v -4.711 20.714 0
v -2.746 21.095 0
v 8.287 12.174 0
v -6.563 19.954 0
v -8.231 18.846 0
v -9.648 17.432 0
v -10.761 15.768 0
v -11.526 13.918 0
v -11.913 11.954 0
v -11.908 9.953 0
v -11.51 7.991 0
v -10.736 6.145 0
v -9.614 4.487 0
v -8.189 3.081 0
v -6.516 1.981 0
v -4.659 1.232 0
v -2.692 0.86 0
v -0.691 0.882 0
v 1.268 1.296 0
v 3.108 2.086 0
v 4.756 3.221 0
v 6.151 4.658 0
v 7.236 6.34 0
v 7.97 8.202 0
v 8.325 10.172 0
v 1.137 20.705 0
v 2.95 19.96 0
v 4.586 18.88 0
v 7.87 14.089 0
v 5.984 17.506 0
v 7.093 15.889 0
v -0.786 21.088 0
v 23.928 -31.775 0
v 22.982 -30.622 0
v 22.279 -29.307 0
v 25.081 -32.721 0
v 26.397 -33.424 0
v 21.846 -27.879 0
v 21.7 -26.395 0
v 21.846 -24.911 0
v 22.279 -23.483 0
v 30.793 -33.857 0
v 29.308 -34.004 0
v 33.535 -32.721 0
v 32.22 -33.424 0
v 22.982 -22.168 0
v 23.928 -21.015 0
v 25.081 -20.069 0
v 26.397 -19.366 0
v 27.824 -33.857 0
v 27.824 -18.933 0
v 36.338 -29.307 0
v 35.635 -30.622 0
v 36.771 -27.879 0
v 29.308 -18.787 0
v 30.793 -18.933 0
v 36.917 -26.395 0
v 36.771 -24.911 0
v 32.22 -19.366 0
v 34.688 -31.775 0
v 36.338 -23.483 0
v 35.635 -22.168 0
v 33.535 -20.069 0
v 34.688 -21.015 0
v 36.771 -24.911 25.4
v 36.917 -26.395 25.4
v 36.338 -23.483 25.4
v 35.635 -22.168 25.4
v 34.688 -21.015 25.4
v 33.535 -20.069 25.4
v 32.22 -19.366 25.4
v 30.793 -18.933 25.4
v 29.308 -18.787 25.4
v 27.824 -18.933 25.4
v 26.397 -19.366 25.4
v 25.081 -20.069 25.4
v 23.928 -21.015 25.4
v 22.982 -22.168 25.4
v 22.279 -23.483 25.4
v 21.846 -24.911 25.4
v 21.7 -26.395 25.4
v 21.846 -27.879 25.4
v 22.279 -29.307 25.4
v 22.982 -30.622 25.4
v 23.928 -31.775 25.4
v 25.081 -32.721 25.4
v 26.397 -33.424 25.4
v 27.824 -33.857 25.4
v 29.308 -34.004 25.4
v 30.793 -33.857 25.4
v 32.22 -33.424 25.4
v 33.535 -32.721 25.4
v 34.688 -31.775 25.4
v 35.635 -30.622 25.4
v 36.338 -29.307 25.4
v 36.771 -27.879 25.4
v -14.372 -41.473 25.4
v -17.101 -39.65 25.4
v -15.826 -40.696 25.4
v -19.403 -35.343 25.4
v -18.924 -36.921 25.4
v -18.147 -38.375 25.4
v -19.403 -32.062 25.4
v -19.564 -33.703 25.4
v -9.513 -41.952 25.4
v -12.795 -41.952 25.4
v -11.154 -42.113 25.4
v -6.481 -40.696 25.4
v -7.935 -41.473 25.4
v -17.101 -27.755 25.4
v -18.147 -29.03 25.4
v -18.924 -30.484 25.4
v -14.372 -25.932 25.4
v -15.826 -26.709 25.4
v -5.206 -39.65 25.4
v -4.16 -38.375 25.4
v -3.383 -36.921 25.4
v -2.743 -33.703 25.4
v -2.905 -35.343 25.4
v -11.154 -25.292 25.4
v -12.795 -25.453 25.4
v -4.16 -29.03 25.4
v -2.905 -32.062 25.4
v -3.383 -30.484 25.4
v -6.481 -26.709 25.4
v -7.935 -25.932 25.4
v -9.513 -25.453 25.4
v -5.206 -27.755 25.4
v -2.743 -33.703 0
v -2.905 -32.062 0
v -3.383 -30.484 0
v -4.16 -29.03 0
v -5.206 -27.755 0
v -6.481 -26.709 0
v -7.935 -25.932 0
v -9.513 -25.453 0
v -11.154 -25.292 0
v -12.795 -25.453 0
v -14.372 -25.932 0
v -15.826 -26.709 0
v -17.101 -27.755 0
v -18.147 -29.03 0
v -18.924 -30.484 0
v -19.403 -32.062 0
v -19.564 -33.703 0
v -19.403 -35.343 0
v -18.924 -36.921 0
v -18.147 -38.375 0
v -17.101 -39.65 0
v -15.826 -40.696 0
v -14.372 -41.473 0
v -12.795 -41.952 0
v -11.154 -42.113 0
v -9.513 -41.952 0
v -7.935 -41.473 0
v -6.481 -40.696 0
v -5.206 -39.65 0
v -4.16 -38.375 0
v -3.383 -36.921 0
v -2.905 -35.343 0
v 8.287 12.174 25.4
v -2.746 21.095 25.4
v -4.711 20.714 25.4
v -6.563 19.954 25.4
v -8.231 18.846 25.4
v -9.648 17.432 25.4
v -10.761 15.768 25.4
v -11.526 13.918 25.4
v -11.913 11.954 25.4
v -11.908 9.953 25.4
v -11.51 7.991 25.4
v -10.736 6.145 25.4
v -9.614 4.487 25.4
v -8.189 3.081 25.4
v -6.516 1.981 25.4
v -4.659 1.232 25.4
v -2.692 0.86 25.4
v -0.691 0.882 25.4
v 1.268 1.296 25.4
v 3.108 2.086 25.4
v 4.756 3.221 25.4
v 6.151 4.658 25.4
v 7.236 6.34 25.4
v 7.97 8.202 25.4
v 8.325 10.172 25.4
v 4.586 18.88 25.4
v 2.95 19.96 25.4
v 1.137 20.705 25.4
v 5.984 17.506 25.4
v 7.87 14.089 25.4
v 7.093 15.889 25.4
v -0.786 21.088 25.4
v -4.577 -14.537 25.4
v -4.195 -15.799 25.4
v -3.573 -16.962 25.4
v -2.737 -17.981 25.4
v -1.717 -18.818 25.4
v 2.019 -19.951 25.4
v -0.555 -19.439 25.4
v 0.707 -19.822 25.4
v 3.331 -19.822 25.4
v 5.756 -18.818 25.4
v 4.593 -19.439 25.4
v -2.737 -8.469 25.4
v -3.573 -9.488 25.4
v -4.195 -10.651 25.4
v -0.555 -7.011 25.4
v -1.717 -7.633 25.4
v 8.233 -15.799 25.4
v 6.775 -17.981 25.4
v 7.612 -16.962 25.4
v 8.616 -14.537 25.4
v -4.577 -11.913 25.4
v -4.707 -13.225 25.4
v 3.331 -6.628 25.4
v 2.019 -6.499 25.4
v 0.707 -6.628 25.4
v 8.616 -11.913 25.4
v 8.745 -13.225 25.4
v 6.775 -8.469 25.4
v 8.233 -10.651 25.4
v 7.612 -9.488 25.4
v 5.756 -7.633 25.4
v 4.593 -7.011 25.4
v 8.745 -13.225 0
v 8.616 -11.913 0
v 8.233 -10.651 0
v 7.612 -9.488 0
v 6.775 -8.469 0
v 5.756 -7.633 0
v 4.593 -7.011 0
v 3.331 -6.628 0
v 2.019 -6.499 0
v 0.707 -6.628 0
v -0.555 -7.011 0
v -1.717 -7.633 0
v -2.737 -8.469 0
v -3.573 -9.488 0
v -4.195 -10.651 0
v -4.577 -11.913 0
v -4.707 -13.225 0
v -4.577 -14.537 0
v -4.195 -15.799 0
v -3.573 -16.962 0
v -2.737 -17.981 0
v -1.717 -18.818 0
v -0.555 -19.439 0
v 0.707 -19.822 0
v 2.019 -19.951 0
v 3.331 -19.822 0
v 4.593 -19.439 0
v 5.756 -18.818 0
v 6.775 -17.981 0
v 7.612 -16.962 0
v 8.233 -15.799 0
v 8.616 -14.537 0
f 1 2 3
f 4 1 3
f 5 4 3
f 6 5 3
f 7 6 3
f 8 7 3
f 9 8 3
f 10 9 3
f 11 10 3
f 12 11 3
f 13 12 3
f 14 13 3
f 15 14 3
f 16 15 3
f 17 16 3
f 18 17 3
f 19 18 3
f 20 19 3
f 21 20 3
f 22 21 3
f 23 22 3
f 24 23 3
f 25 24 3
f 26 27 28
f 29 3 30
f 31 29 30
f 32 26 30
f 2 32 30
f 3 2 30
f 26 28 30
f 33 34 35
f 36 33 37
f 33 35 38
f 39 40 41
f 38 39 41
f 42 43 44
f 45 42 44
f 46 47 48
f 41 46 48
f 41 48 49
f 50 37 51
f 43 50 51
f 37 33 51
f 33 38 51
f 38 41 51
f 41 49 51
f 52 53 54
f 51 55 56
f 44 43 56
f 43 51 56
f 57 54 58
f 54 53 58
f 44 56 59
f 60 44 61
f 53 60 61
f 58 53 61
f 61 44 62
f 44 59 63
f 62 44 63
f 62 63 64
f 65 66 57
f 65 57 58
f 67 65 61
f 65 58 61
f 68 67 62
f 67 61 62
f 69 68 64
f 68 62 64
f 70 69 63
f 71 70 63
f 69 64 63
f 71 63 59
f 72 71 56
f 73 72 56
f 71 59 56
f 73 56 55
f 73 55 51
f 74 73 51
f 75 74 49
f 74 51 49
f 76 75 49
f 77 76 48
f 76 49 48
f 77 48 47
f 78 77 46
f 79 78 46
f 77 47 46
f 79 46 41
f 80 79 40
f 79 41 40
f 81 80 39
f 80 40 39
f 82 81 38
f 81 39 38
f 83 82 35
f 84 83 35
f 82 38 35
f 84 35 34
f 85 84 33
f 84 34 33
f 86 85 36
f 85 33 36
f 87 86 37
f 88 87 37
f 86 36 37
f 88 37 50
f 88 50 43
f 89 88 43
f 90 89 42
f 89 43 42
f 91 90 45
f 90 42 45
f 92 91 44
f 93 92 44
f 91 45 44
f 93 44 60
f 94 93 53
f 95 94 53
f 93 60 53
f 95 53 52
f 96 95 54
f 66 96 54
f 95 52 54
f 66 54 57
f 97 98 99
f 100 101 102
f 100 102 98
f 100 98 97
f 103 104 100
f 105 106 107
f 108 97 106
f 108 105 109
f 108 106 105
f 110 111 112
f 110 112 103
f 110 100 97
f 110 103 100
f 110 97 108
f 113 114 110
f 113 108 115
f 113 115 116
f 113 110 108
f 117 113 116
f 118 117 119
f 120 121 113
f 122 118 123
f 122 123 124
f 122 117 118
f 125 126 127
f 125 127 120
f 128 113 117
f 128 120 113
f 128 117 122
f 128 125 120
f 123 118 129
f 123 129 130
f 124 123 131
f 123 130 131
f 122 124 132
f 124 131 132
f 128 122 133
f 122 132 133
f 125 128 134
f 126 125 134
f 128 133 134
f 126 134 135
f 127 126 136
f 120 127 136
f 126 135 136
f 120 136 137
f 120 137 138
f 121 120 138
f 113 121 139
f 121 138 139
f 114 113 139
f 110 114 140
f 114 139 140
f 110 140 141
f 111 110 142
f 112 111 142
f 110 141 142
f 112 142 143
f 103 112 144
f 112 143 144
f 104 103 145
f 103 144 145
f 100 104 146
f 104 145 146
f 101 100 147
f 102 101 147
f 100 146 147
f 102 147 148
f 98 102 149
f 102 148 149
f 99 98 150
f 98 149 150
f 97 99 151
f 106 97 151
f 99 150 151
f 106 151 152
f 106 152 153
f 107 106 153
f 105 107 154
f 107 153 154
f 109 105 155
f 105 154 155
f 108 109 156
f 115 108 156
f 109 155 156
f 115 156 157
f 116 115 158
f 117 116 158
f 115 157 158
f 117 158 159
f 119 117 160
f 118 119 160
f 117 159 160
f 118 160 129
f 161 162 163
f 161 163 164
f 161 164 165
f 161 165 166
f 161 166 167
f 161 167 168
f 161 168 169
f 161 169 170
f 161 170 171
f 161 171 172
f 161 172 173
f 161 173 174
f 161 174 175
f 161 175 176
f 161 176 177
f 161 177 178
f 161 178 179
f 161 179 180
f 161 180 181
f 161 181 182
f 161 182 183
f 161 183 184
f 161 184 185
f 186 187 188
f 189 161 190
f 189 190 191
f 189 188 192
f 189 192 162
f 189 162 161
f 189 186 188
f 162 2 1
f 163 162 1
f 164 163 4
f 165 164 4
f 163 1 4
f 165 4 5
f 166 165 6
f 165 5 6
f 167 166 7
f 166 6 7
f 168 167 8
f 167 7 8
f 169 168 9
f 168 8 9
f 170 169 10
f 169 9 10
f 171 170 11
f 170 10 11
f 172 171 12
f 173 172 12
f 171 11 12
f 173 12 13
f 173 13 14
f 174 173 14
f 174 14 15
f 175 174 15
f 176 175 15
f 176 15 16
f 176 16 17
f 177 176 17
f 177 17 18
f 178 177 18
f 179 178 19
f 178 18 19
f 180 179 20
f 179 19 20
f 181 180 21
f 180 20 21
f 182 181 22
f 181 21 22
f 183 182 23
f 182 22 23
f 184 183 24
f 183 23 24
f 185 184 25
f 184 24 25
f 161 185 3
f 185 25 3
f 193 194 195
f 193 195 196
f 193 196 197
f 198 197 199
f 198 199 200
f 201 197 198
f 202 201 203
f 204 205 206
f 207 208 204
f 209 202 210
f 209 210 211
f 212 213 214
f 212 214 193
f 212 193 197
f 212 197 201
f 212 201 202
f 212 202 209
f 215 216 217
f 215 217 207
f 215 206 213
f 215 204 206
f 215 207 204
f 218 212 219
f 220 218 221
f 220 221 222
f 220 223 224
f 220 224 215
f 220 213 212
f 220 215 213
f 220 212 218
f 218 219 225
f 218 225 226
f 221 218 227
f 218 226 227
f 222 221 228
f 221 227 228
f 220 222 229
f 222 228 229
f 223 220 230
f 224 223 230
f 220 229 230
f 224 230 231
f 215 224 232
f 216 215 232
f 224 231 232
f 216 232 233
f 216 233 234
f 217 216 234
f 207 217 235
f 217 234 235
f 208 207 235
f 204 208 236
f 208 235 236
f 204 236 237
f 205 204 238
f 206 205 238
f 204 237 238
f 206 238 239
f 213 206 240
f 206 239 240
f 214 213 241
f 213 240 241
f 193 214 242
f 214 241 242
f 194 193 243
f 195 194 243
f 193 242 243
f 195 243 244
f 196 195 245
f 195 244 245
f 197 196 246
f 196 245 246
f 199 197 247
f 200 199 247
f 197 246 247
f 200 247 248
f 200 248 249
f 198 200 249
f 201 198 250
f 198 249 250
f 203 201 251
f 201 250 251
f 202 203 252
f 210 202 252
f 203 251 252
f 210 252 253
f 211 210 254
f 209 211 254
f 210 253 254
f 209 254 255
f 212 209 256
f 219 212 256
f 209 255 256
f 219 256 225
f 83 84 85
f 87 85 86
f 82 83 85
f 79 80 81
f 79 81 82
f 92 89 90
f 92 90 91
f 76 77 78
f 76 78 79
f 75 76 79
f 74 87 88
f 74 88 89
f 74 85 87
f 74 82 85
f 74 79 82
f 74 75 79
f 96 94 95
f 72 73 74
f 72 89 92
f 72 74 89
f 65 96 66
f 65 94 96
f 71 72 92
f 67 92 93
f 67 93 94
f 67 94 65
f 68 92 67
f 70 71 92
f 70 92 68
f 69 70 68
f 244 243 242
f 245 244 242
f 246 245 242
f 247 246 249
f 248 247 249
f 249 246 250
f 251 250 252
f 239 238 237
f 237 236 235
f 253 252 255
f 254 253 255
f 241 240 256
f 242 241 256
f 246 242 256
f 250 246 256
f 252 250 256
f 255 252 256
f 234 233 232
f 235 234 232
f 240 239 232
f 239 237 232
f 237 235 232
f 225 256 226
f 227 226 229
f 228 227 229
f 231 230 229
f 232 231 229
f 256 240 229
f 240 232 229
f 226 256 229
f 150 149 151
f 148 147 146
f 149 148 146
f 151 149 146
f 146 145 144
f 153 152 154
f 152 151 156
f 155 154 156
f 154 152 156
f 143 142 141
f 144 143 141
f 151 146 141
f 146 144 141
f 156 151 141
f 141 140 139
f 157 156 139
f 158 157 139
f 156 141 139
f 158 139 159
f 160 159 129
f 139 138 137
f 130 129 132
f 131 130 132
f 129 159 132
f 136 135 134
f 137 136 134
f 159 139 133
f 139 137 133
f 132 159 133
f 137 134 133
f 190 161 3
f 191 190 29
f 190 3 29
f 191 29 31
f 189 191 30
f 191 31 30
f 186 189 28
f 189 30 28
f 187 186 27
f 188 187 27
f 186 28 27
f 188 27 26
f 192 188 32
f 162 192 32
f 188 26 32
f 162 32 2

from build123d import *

# Parameters (mm, degrees)
F5_DEPTH = 25.4
F4_R     = 6.7259983567
F1_R     = 8.4107438271
F2_R     = 7.608509741


# Not quite as in the source:
# - the program builds the solid bodies; features that only make, move or delete a surface that nothing else refers to are left out


with BuildPart() as f5:
    # F0 (on Top) → F5 (new body)
    with BuildSketch(Plane.XY):
        with BuildLine():
            ThreePointArc((-11.4537579939, 7.812615484), (0.3902658063, 1.0605246734), (8.2872472703, 12.1739991009))
            ThreePointArc((8.2872472703, 12.1739991009), (4.5861760116, 18.8798650483), (-2.7458775352, 21.0951657847))
            ThreePointArc((-2.7458775352, 21.0951657847), (-10.2972299306, 16.5500756507), (-11.4537579939, 7.812615484))
        make_face()
    extrude(amount=F5_DEPTH)


with BuildPart() as f5b:
    # F4 (on Top) → F5, piece 2 (new body)
    with BuildSketch(Plane.XY):
        with Locations((2.0192693919, -13.2251810282)):
            Circle(F4_R)
    extrude(amount=F5_DEPTH)


with BuildPart() as f5c:
    # F1 (on Top) → F5, piece 3 (new body)
    with BuildSketch(Plane.XY):
        with Locations((-11.1536812037, -33.7025821209)):
            Circle(F1_R)
    extrude(amount=F5_DEPTH)


with BuildPart() as f5d:
    # F2 (on Top) → F5, piece 4 (new body)
    with BuildSketch(Plane.XY):
        with Locations((29.3082781136, -26.3951309025)):
            Circle(F2_R)
    extrude(amount=F5_DEPTH)


solid = Compound([f5.part, f5b.part, f5c.part, f5d.part])
